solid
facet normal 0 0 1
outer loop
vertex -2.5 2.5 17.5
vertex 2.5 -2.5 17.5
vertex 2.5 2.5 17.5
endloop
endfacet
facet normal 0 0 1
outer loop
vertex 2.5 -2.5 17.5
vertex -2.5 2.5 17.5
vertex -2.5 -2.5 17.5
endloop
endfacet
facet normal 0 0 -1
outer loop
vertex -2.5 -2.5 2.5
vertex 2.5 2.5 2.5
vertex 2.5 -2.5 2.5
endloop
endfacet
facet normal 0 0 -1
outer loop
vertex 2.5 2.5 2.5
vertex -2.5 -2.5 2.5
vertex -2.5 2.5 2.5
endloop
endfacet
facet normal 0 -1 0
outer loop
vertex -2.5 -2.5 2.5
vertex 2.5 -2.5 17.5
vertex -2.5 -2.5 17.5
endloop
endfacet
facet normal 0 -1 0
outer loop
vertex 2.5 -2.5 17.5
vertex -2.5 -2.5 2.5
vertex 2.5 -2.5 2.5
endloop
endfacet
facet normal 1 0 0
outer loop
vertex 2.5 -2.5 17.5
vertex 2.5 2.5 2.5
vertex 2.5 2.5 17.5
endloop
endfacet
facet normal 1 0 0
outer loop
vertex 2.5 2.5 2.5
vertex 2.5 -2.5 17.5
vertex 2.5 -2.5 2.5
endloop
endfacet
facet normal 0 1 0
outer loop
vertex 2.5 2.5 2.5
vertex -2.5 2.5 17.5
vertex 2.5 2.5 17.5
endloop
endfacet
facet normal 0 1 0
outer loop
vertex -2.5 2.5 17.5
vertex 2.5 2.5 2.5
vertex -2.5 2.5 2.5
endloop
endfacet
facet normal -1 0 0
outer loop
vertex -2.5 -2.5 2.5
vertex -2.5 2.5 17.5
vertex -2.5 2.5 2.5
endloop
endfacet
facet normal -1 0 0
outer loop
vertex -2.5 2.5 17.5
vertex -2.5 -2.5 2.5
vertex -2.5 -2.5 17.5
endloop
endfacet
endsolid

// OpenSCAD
save_base = false;

if (save_base){
    color("green") difference() {
        cube(size = [10,10,5], center = true);
        cylinder(h = 10, d=4, center=true, $fn=100);
    }
} else {

    color("red") translate([-2.5,-2.5,2.5]) cube(size = [5,5,15], center =false);
};
